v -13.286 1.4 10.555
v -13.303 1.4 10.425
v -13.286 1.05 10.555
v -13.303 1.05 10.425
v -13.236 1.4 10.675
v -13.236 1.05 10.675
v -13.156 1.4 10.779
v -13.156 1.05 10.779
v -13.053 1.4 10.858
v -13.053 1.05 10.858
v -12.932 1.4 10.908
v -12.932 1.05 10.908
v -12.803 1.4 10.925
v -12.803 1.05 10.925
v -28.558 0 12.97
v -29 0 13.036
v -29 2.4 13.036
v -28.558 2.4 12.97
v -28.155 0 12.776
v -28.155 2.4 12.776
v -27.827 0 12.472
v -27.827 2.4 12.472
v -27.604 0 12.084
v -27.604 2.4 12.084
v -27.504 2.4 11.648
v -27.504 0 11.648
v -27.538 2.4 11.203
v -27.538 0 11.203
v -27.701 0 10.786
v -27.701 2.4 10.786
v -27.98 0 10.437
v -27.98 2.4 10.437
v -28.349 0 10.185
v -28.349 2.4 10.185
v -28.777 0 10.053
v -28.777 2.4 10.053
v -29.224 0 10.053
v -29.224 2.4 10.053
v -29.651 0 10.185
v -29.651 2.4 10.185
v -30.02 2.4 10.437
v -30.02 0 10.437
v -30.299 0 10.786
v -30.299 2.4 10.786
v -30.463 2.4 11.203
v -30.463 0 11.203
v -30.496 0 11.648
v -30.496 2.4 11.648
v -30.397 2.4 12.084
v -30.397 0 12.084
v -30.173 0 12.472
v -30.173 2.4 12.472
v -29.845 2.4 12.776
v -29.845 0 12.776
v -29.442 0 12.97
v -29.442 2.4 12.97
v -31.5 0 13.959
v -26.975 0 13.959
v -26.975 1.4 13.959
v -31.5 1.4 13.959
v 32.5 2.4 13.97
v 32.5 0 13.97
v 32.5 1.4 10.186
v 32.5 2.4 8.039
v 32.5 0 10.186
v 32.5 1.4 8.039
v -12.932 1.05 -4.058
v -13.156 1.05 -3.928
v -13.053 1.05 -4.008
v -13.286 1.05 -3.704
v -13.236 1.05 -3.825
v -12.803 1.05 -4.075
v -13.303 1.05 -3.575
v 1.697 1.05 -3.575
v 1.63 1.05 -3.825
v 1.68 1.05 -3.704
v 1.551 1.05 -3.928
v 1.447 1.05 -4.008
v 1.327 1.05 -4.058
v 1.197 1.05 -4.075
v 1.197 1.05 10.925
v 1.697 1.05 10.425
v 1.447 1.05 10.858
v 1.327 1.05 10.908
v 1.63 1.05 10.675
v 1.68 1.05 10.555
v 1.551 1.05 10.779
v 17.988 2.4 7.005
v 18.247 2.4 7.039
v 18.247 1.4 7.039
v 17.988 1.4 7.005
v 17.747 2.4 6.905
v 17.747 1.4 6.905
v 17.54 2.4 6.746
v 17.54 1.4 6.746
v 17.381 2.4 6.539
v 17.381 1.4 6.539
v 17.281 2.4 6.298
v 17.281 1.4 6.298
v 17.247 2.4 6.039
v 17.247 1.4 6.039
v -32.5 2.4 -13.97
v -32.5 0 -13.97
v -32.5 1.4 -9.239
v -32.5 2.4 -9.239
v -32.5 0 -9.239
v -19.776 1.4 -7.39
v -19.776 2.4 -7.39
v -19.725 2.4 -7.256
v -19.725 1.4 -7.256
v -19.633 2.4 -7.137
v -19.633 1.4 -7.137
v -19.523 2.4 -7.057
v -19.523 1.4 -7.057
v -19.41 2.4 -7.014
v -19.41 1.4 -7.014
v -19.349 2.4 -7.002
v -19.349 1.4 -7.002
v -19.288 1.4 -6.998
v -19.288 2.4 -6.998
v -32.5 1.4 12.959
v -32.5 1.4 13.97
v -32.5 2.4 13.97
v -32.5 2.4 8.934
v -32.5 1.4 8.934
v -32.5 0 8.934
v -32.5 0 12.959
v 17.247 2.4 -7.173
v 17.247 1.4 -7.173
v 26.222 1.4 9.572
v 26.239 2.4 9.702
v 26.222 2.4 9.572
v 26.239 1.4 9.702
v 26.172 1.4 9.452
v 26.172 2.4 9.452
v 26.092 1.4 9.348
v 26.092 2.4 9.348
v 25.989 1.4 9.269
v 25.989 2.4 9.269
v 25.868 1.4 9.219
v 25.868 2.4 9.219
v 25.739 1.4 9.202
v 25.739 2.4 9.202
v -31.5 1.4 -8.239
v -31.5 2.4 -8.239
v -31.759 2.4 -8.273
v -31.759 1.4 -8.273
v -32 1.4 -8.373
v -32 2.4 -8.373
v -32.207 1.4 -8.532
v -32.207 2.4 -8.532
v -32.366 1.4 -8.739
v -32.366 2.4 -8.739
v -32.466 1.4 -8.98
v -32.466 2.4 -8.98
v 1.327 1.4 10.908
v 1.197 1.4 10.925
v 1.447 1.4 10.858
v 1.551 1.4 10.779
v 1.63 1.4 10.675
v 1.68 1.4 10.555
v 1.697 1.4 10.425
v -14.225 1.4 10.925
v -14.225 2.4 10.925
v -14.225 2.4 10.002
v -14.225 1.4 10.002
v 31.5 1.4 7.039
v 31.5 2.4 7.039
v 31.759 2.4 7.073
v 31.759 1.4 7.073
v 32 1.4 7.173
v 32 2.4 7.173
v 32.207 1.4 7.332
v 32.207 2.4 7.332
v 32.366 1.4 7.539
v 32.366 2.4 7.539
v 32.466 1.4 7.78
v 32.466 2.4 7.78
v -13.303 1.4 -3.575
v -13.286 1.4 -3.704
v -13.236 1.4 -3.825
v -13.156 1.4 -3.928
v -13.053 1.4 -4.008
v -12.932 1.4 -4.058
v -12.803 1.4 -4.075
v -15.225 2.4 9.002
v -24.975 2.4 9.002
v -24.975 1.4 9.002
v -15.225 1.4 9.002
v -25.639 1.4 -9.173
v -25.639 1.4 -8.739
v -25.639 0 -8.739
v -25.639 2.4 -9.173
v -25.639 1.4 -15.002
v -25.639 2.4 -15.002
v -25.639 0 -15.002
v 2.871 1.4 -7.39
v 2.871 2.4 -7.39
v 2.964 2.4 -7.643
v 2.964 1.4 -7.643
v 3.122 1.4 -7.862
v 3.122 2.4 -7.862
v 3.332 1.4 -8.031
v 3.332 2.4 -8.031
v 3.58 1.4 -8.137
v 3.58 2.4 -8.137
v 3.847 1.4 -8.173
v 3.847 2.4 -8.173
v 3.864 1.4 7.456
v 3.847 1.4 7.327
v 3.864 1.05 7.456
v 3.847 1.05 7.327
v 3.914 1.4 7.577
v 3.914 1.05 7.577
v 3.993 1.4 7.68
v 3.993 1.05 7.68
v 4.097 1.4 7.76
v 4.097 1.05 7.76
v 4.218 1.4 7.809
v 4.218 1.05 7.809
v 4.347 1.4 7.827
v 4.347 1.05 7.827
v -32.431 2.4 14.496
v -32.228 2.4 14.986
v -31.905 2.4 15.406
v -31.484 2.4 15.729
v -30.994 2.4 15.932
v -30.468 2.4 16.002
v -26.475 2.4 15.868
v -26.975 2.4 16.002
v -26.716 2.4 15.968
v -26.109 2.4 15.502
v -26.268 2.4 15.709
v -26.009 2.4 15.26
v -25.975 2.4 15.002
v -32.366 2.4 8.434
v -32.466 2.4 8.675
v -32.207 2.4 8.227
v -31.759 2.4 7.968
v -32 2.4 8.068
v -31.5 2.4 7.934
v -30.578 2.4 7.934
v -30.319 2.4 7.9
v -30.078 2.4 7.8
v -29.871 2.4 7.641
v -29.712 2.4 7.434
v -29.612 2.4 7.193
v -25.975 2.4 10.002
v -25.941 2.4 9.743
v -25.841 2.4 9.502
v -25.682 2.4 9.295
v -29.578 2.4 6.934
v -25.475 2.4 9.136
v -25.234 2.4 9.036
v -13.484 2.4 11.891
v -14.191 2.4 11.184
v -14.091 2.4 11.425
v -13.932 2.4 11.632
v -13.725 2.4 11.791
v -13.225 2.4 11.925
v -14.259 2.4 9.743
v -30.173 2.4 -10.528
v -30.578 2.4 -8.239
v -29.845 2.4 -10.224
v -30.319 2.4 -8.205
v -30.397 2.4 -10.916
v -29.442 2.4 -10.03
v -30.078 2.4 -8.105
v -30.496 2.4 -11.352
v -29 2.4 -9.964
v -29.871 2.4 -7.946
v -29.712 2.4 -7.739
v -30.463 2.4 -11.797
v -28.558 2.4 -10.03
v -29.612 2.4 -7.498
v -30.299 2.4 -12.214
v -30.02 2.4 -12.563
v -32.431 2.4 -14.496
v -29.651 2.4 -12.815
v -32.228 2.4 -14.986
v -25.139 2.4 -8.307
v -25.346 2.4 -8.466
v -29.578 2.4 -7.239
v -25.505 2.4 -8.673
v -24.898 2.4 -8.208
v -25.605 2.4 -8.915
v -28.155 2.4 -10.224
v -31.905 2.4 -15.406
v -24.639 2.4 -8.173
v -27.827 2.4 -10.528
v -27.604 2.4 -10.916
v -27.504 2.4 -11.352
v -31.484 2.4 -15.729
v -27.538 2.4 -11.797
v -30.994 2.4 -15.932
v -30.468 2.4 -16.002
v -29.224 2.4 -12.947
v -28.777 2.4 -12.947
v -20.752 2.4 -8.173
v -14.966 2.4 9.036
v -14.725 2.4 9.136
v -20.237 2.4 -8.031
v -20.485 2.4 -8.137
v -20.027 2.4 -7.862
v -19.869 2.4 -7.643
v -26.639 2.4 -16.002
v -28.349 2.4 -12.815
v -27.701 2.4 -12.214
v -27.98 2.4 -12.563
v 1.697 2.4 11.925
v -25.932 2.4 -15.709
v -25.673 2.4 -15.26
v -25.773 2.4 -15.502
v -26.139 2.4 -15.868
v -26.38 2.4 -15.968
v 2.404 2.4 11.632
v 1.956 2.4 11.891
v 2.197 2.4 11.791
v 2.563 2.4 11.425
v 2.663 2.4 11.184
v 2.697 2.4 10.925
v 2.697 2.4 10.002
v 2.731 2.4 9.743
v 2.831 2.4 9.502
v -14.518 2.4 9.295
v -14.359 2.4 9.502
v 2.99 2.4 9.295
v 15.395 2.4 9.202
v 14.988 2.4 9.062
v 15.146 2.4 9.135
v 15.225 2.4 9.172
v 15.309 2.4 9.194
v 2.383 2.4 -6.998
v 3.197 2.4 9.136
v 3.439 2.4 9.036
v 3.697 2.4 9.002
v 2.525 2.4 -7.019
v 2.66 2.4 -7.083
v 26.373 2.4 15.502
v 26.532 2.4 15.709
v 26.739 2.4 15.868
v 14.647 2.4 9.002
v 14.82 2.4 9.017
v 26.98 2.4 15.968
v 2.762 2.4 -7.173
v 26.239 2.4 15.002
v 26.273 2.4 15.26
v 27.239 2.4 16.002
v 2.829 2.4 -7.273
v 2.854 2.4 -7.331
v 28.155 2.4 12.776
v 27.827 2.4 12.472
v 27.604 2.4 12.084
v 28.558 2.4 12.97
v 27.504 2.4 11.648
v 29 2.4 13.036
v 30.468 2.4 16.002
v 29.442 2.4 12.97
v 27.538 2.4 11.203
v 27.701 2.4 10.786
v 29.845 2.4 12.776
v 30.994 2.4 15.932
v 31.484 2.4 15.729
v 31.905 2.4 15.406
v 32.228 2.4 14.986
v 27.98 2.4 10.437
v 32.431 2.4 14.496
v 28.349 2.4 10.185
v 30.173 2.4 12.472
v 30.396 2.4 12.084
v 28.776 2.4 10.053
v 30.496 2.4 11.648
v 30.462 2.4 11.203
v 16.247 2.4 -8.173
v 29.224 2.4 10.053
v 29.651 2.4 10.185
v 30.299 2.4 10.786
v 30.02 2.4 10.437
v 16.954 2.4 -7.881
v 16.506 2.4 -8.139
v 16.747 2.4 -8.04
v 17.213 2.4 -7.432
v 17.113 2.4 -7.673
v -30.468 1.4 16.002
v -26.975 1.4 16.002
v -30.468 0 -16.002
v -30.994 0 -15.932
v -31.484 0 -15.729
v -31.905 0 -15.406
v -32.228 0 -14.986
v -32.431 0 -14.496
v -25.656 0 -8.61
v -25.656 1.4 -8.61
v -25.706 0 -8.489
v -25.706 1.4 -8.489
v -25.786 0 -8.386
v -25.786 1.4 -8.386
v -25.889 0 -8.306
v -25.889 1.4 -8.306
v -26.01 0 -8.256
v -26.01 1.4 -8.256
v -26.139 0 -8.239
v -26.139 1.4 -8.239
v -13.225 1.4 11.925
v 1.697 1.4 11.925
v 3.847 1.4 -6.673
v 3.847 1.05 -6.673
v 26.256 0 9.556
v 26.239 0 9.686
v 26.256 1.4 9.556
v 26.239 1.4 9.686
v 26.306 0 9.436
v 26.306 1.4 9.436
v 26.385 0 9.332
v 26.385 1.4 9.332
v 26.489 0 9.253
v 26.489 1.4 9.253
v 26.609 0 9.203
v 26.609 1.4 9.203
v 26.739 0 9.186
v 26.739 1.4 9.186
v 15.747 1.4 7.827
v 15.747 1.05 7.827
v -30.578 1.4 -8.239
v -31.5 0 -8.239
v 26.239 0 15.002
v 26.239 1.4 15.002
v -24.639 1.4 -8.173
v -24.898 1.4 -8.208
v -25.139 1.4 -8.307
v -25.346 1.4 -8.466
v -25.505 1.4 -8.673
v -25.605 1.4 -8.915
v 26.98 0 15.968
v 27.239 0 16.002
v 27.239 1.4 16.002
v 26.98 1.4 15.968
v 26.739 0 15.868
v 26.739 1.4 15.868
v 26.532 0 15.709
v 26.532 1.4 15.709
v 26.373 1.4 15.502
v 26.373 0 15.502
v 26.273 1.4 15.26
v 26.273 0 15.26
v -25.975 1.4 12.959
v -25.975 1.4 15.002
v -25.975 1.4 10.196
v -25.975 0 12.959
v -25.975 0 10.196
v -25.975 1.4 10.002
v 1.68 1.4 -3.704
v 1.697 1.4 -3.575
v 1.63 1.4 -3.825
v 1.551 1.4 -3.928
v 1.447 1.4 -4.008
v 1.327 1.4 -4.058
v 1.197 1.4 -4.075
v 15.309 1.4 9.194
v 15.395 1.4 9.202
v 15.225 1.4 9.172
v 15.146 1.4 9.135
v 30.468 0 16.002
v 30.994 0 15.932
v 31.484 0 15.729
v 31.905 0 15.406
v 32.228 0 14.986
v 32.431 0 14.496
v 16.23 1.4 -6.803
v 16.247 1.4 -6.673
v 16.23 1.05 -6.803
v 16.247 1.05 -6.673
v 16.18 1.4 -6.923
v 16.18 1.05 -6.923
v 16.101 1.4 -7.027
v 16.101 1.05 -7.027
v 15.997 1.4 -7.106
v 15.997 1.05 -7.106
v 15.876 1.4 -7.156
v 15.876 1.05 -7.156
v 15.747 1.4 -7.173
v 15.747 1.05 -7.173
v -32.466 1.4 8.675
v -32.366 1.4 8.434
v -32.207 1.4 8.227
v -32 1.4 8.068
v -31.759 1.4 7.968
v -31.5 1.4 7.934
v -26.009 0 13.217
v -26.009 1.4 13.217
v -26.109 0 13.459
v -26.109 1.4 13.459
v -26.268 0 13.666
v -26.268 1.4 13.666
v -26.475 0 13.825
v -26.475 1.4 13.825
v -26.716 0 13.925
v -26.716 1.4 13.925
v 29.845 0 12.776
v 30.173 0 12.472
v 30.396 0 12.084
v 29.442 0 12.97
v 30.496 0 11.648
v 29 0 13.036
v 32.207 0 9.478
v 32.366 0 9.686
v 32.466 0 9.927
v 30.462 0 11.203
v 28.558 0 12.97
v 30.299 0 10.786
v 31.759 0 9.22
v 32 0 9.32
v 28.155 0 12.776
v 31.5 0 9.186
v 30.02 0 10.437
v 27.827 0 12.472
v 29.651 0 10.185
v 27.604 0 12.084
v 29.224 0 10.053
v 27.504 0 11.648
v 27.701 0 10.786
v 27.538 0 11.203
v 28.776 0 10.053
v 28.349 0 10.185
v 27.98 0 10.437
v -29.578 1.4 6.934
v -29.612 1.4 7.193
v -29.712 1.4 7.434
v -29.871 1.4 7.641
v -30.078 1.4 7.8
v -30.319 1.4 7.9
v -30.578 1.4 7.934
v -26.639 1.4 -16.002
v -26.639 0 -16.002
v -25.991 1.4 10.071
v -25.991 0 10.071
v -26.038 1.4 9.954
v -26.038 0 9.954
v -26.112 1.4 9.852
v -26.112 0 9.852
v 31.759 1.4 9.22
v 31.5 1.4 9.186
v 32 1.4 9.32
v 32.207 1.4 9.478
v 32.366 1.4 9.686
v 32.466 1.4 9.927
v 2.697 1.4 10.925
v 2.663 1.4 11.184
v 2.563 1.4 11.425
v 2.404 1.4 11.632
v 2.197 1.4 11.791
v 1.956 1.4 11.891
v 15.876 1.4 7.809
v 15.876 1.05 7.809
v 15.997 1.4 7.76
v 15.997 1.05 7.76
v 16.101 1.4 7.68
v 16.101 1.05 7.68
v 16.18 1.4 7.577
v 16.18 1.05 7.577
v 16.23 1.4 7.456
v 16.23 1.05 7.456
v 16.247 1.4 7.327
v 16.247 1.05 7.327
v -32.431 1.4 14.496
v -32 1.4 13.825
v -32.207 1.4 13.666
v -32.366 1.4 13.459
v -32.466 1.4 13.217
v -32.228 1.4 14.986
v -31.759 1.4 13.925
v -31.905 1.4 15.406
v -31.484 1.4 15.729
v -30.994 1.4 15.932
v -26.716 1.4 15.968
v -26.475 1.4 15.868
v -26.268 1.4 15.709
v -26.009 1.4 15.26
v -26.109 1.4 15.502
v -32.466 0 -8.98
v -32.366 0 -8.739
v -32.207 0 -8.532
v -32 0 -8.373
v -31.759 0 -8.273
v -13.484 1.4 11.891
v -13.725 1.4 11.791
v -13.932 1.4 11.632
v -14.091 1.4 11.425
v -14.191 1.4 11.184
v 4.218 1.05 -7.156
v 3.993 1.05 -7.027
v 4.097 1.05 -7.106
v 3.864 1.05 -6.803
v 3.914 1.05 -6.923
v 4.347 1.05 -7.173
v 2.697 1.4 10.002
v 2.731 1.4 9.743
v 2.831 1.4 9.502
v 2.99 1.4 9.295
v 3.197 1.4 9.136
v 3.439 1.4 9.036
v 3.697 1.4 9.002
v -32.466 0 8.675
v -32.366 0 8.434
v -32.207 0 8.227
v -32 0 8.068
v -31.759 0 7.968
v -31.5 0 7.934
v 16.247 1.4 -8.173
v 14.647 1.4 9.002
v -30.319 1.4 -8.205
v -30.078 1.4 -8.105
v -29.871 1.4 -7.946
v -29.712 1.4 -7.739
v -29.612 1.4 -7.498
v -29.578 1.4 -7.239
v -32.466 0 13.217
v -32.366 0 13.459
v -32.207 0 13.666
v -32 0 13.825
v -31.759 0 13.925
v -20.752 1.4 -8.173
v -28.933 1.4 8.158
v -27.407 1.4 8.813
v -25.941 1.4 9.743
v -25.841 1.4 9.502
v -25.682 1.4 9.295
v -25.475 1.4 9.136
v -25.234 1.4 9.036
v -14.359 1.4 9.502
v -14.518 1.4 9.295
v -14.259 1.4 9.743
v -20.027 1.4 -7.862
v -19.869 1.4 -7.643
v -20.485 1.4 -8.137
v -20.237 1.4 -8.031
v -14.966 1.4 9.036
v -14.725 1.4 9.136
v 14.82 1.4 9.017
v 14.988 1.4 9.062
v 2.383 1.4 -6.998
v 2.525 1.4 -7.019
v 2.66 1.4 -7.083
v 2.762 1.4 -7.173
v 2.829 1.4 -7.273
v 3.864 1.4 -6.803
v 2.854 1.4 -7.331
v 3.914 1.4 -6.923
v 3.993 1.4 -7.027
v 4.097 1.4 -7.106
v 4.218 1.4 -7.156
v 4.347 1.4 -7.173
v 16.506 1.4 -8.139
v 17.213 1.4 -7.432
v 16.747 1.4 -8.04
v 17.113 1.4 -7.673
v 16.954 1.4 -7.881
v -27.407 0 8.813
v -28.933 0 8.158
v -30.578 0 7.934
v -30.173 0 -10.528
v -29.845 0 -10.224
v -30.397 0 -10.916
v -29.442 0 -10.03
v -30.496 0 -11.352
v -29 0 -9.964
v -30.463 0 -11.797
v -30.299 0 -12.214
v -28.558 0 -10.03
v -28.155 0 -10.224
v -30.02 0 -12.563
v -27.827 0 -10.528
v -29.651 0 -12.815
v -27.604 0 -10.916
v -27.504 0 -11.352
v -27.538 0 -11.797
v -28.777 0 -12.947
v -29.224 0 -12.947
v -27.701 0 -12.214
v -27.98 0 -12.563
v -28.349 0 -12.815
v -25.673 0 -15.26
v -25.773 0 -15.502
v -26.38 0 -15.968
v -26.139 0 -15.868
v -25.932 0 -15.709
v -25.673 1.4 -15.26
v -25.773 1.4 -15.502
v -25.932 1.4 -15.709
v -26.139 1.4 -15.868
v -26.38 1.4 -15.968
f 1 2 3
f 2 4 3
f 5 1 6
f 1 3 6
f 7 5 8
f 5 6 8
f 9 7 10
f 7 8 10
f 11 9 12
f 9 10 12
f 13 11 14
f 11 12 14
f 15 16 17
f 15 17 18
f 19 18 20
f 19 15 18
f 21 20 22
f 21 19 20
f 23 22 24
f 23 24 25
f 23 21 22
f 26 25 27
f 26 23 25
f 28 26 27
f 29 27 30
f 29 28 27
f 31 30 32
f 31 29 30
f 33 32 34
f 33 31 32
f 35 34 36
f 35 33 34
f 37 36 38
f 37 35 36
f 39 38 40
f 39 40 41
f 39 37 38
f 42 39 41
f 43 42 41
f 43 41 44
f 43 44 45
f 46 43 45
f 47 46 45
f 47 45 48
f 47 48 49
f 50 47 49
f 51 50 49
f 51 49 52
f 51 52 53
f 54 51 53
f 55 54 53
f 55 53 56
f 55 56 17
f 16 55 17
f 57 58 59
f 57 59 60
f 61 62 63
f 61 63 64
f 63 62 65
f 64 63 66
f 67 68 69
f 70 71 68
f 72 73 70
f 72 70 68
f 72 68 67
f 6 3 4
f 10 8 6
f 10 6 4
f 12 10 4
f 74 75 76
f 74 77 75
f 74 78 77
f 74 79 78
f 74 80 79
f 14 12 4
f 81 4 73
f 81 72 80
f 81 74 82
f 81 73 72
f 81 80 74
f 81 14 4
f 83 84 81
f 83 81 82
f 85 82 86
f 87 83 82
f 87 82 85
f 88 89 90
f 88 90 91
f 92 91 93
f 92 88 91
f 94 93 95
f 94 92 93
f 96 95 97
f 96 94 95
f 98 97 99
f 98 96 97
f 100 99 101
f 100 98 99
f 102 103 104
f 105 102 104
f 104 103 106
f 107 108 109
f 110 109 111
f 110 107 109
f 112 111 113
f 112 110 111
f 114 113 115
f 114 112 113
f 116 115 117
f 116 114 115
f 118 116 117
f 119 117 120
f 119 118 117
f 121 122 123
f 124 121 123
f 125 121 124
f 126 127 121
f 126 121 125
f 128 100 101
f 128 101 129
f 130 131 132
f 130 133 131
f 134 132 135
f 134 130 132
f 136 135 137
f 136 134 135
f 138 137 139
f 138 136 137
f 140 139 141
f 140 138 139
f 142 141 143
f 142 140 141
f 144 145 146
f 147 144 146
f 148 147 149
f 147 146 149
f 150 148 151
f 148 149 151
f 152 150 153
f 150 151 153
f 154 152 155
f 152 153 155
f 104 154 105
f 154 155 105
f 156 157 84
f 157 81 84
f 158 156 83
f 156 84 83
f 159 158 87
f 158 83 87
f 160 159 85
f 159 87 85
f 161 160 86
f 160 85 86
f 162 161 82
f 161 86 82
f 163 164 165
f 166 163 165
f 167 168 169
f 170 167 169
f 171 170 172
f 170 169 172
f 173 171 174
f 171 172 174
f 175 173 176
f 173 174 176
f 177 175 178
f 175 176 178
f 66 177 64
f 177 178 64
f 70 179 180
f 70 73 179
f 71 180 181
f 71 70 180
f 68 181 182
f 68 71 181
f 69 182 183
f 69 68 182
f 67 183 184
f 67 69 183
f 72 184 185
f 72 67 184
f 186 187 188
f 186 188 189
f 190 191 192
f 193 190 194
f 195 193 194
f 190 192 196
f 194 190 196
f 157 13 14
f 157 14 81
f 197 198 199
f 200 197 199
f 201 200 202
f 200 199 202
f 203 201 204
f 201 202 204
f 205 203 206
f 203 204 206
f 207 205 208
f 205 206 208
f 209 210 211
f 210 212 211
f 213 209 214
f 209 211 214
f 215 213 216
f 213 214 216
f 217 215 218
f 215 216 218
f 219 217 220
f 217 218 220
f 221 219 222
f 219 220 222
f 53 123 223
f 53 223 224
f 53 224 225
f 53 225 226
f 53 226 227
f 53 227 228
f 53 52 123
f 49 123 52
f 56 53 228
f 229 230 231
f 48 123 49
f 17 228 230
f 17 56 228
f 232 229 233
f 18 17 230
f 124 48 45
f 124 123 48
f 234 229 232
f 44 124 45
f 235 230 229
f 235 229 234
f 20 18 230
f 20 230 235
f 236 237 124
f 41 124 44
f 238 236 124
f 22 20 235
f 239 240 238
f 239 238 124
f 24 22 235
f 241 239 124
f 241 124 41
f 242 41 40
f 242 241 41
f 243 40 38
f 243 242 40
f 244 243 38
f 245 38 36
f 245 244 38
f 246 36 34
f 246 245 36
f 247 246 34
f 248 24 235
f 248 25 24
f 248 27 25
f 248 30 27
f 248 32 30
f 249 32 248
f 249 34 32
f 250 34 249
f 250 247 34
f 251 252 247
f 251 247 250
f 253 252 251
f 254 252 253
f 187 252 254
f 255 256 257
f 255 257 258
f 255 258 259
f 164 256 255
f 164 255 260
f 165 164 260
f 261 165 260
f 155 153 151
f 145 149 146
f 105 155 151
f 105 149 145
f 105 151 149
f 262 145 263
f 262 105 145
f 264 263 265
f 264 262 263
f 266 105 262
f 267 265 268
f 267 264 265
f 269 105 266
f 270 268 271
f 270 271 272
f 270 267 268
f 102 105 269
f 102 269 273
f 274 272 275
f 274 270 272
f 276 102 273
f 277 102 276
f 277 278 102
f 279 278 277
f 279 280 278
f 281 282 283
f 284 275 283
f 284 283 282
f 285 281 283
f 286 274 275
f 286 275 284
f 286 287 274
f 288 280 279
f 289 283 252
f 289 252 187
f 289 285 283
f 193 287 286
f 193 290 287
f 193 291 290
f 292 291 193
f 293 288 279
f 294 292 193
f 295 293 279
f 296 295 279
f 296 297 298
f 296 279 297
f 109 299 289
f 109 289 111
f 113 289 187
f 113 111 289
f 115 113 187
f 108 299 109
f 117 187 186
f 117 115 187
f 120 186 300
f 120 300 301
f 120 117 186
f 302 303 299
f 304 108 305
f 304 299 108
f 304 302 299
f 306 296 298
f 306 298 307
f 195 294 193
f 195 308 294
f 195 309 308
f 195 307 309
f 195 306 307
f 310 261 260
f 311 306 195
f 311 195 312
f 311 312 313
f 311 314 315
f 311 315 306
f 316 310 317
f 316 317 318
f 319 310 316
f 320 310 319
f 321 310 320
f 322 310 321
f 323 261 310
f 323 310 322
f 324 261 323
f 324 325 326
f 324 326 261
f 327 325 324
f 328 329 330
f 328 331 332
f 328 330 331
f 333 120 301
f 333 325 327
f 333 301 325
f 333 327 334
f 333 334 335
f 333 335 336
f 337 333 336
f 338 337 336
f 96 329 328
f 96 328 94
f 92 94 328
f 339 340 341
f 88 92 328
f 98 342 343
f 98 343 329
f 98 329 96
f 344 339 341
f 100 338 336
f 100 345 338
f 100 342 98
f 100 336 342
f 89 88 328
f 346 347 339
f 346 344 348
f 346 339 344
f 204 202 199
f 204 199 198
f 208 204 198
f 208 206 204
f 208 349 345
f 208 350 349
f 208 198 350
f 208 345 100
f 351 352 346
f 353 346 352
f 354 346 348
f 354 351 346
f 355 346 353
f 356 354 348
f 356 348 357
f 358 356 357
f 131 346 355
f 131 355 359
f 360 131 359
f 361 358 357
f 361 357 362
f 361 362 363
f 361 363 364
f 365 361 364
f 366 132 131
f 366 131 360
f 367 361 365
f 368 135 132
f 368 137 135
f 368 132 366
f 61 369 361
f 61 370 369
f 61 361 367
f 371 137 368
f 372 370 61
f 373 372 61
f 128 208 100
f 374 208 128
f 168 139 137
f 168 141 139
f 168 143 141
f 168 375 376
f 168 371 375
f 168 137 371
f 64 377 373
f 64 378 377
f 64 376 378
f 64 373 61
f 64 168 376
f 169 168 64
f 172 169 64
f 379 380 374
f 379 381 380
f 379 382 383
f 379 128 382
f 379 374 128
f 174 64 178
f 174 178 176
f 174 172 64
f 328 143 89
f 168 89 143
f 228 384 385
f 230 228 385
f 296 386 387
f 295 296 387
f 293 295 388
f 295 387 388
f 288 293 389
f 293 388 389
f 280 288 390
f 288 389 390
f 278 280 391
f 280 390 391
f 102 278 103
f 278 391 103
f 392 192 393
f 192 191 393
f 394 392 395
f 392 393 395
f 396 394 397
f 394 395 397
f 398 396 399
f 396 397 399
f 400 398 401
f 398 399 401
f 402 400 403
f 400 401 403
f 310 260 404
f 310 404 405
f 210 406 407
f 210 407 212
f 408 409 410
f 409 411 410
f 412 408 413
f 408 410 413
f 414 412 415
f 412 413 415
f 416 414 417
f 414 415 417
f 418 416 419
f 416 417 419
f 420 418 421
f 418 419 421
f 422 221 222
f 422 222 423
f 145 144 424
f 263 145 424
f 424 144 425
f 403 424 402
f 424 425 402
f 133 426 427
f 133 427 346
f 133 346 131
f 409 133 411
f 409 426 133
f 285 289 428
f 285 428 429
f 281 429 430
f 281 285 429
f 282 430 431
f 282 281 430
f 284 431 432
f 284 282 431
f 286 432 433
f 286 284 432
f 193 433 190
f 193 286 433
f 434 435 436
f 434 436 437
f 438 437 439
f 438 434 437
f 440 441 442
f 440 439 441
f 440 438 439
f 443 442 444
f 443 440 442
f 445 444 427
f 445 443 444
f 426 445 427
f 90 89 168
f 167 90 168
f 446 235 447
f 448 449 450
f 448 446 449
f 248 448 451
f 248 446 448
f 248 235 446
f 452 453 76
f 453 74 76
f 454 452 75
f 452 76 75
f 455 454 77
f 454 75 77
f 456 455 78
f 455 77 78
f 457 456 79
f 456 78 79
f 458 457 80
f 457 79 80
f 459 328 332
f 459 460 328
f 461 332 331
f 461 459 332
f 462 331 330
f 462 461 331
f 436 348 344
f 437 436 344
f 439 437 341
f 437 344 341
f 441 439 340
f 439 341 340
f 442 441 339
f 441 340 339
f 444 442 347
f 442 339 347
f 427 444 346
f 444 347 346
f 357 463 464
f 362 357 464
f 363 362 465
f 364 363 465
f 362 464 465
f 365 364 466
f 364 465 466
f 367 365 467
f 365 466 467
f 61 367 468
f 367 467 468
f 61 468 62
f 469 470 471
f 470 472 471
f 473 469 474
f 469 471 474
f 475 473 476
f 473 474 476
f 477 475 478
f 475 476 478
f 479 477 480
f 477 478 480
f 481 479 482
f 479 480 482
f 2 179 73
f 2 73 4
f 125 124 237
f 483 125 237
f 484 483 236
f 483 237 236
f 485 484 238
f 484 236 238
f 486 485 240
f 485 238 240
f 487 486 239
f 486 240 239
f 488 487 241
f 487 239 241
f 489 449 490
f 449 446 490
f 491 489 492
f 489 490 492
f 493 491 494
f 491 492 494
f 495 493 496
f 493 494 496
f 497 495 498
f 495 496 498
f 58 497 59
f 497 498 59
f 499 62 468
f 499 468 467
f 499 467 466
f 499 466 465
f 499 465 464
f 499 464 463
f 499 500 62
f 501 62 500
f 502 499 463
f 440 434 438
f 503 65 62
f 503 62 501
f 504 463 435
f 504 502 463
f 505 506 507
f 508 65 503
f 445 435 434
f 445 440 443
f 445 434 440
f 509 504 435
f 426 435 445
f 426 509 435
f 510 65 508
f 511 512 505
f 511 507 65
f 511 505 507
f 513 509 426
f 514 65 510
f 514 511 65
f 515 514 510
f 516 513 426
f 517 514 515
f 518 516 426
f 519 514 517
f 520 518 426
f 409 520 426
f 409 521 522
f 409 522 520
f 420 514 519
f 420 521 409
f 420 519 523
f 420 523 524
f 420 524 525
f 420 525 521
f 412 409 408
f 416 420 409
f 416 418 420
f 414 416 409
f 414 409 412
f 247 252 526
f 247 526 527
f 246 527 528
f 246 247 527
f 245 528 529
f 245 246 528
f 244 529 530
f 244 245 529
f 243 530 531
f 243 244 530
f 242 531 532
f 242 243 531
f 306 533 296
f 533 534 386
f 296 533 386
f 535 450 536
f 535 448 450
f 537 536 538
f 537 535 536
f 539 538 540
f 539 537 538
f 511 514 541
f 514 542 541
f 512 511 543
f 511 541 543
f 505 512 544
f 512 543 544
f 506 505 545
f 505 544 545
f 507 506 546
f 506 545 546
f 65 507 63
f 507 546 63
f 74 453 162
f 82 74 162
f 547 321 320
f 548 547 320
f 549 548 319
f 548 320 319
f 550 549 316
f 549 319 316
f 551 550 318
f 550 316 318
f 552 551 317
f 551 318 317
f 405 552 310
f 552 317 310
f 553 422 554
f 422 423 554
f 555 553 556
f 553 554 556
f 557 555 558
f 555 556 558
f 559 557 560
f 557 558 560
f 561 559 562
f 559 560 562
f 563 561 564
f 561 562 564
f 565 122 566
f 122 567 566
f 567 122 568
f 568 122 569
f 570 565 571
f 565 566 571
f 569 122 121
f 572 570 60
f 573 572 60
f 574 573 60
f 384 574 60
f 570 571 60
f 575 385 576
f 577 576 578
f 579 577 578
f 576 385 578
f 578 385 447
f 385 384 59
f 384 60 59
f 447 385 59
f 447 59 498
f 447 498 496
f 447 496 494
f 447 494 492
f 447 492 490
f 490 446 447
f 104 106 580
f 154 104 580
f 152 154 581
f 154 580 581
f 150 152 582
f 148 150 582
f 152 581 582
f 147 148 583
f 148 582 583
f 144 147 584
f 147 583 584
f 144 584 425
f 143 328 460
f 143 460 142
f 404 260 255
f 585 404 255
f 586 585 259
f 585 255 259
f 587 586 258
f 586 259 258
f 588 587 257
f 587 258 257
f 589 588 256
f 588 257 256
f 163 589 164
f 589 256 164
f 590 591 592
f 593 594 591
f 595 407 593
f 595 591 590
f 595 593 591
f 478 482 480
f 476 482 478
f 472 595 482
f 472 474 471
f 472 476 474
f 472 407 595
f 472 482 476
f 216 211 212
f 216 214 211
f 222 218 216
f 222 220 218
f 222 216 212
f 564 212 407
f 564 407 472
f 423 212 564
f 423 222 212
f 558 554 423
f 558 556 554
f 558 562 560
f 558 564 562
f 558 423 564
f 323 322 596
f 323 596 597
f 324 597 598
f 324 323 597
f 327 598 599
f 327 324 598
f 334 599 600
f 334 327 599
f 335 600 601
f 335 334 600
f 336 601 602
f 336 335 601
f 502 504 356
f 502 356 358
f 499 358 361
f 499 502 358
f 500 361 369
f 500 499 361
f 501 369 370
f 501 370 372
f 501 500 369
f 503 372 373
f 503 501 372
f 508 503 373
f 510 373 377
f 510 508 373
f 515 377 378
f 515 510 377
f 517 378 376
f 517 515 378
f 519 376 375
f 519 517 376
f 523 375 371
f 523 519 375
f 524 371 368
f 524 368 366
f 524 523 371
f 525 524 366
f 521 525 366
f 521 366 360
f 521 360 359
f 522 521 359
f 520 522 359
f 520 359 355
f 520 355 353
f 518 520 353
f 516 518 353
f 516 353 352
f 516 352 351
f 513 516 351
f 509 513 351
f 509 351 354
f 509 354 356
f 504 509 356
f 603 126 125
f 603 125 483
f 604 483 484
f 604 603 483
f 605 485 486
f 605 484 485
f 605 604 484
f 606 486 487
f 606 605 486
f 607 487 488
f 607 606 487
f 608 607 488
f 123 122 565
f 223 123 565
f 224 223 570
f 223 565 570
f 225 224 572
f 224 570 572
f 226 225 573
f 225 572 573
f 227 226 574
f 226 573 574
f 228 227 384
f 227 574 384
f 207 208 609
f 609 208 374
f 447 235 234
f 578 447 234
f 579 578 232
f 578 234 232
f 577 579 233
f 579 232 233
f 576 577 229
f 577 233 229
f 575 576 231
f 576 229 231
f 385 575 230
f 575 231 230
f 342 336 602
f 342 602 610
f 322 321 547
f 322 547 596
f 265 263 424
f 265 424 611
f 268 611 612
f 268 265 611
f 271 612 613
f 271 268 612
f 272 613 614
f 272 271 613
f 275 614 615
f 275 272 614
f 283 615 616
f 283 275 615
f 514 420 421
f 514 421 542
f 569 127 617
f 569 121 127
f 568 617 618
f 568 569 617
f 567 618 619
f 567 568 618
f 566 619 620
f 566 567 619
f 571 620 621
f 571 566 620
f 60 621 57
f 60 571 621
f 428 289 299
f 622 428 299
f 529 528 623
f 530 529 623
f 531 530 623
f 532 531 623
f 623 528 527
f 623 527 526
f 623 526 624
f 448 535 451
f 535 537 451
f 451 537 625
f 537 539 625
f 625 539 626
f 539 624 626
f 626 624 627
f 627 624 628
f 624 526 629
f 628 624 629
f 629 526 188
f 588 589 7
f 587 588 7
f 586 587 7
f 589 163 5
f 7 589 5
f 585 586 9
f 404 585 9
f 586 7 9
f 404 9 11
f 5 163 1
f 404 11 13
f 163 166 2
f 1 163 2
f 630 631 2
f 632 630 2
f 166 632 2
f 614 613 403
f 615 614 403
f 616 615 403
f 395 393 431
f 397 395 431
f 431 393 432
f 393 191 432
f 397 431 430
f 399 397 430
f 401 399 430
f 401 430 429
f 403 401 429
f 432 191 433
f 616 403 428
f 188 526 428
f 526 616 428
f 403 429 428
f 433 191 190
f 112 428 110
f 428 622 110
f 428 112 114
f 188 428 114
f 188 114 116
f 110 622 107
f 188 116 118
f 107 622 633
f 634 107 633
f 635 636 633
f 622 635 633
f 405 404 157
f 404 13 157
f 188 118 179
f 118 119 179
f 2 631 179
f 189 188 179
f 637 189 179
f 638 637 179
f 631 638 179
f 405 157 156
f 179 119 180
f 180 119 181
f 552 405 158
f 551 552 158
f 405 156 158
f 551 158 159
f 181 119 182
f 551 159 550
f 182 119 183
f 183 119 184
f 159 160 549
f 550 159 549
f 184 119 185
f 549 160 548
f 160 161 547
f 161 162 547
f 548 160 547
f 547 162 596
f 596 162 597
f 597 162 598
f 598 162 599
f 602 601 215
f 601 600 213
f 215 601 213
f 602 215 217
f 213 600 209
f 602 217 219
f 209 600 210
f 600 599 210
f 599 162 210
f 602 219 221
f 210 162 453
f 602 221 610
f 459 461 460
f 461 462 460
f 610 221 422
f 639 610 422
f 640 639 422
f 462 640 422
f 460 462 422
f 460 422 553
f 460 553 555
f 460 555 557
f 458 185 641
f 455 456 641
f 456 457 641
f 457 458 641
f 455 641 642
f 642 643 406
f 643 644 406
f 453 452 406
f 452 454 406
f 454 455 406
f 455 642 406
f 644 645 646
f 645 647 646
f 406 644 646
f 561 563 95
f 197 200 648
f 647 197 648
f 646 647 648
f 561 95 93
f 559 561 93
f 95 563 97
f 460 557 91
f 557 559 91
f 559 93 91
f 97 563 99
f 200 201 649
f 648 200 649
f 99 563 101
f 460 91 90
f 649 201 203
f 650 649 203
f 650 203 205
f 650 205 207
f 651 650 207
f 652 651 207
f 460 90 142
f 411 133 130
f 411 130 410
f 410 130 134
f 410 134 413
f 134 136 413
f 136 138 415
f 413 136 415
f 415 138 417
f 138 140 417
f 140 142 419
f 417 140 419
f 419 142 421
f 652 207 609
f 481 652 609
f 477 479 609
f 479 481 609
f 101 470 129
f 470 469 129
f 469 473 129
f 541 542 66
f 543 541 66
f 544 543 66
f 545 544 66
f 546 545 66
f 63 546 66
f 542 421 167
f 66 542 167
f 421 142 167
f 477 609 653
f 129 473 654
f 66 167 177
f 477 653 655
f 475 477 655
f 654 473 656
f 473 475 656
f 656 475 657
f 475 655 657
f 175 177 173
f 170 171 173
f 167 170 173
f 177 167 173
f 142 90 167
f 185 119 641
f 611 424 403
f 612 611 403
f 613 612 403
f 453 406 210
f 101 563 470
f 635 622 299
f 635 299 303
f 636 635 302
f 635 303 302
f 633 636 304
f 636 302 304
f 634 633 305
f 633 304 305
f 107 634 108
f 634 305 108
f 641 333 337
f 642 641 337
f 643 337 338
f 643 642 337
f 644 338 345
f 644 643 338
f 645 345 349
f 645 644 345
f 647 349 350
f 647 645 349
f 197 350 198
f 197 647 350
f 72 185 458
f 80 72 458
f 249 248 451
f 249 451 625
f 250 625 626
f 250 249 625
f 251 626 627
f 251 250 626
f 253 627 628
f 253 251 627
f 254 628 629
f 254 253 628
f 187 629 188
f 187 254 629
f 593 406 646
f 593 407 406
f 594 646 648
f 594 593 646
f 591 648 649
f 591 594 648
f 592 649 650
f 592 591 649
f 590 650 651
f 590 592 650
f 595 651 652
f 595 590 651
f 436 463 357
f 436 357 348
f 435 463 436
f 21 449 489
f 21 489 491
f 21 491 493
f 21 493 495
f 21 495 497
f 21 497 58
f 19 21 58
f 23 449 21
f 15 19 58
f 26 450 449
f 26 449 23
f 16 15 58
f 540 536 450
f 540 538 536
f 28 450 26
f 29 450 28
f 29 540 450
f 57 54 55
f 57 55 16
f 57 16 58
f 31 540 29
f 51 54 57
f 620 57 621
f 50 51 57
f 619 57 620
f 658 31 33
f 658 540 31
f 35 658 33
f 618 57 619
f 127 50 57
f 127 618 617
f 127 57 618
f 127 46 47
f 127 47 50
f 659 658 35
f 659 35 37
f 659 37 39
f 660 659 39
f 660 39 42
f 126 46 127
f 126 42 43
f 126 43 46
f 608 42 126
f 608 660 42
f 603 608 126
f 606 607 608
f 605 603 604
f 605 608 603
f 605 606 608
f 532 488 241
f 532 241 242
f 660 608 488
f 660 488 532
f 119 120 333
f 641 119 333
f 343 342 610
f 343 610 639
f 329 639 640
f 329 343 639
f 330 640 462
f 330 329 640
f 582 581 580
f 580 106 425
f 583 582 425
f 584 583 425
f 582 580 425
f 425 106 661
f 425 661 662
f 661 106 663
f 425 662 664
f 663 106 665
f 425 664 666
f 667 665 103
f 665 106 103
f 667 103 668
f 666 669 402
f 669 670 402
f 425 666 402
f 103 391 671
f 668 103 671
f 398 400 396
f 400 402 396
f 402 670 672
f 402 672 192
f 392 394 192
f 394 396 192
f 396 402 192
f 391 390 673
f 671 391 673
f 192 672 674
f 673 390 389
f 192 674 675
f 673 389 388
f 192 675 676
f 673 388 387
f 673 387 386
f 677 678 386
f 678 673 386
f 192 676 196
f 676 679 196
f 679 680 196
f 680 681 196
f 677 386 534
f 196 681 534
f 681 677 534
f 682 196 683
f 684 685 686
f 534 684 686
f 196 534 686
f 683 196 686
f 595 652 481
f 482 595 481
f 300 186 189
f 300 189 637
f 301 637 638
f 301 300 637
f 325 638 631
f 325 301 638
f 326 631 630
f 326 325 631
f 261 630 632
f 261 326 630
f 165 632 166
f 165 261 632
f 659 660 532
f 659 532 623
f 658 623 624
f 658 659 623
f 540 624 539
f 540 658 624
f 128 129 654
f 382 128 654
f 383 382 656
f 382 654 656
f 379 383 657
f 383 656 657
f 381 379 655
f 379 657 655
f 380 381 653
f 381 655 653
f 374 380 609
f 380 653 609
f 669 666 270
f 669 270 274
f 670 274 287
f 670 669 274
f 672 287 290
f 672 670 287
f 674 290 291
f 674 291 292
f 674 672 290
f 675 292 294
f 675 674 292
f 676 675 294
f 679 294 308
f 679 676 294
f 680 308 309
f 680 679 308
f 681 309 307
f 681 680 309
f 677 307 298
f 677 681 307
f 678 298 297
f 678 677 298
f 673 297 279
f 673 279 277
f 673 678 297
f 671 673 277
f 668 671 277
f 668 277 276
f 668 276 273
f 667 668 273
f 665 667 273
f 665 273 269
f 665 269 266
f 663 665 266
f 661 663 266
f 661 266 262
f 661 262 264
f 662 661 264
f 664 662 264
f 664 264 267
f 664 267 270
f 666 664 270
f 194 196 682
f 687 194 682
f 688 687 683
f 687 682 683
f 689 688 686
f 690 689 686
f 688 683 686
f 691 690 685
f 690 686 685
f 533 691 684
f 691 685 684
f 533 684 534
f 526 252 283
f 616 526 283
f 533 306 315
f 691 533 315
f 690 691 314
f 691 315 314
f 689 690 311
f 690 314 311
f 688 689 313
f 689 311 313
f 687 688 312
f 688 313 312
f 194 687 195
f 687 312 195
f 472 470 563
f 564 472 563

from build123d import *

# Parameters (mm, degrees)
BOSS_EXTRUDE1_START = 1.4
SKETCH2_R           = 1.5
BOSS_EXTRUDE1_DEPTH = 1
SKETCH4_W           = 51.3
SKETCH4_H           = 7.828136
CUT_EXTRUDE1_DEPTH  = 37.239562
SKETCH5_W           = 15.253092
SKETCH5_H           = 23.040436
CUT_EXTRUDE2_DEPTH  = 37.239562
SKETCH6_W           = 22.069426
SKETCH6_H           = 6.8
SKETCH6_W_2         = 11.75
SKETCH6_H_2         = 7
CUT_EXTRUDE3_DEPTH  = 37.239562
SKETCH7_W           = 2.92226
SKETCH7_H           = 16.173552
SKETCH7_W_2         = 22.599024
SKETCH7_H_2         = 1.175102
CUT_EXTRUDE4_DEPTH  = 37.239562
FILLET8_R           = 1
FILLET10_R          = 0.5
SKETCH9_W           = 12.4
SKETCH9_H           = 15
SKETCH9_W_2         = 15
BOSS_EXTRUDE2_DEPTH = 0.35
FILLET3_R           = 0.5
BOSS_EXTRUDE3_START = -2.4
SKETCH10_R          = 1.5
BOSS_EXTRUDE3_DEPTH = 2.4
FILLET6_R           = 0.5
FILLET11_R          = 1
FILLET13_R          = 0.5


with BuildPart() as part:
    # Sketch2 → Boss-Extrude1 (new body)
    with BuildSketch(Plane(origin=(0, 0, 0), x_dir=(1, 0, 0), z_dir=(0, 1, 0)).offset(BOSS_EXTRUDE1_START)):
        with BuildLine():
            Line((-32.500062, 13.969619), (-32.500062, -13.969619))
            ThreePointArc((-32.500062, -13.969619), (-31.904903, -15.40646), (-30.468062, -16.001619))
            Line((-30.468062, -16.001619), (30.468062, -16.001619))
            ThreePointArc((30.468062, -16.001619), (31.904903, -15.40646), (32.500062, -13.969619))
            Line((32.500062, -13.969619), (32.500062, 13.969619))
            ThreePointArc((32.500062, 13.969619), (31.904903, 15.40646), (30.468062, 16.001619))
            Line((30.468062, 16.001619), (-30.468062, 16.001619))
            ThreePointArc((-30.468062, 16.001619), (-31.904903, 15.40646), (-32.500062, 13.969619))
        make_face()
        with Locations(Location((28.999942, 11.463655, 0), (0, 0, 270))):
            Circle(SKETCH2_R, mode=Mode.SUBTRACT)
        with Locations(Location((28.999942, -11.536299, 0), (0, 0, 270))):
            Circle(SKETCH2_R, mode=Mode.SUBTRACT)
        with Locations(Location((-29.000196, -11.536299, 0), (0, 0, 270))):
            Circle(SKETCH2_R, mode=Mode.SUBTRACT)
        with Locations(Location((-29.000196, 11.463655, 0), (0, 0, 270))):
            Circle(SKETCH2_R, mode=Mode.SUBTRACT)
    extrude(amount=BOSS_EXTRUDE1_DEPTH)

    # Sketch4 → Cut-Extrude1 (cut, through all)
    with BuildSketch(Plane(origin=(0, 2.4, 0), x_dir=(1, 0, 0), z_dir=(0, 1, 0))):
        with Locations((0.010922, 12.087551)):
            Rectangle(SKETCH4_W, SKETCH4_H)
    extrude(amount=-CUT_EXTRUDE1_DEPTH, mode=Mode.SUBTRACT)

    # Sketch5 → Cut-Extrude2 (cut, through all)
    with BuildSketch(Plane(origin=(0, 2.4, 0), x_dir=(1, 0, 0), z_dir=(0, 1, 0))):
        with Locations((24.873516, 4.481401)):
            Rectangle(SKETCH5_W, SKETCH5_H)
    extrude(amount=-CUT_EXTRUDE2_DEPTH, mode=Mode.SUBTRACT)

    # Sketch6 → Cut-Extrude3 (cut, through all)
    with BuildSketch(Plane(origin=(0, 2.4, 0), x_dir=(1, 0, 0), z_dir=(0, 1, 0))):
        with Locations((15.204059, -12.601619)):
            Rectangle(SKETCH6_W, SKETCH6_H)
        with Locations((-20.100036, -12.501619)):
            Rectangle(SKETCH6_W_2, SKETCH6_H_2)
    extrude(amount=-CUT_EXTRUDE3_DEPTH, mode=Mode.SUBTRACT)

    # Sketch7 → Cut-Extrude4 (cut, through all)
    with BuildSketch(Plane(origin=(0, 2.4, 0), x_dir=(1, 0, 0), z_dir=(0, 1, 0))):
        Polygon((2.69737, -11.925317), (2.69737, -9.001619), (15.24697, -9.001619), (15.24697, -16.001619), (-14.225036, -16.001619), (-14.225036, -11.925317), align=None)
        with Locations((-31.038932, 0.152527)):
            Rectangle(SKETCH7_W, SKETCH7_H)
        with Locations((-8.452542, 7.585932)):
            Rectangle(SKETCH7_W_2, SKETCH7_H_2)
    extrude(amount=-CUT_EXTRUDE4_DEPTH, mode=Mode.SUBTRACT)

    # Fillet8
    # the kernel refuses this fillet: 1 mm, written as the material it adds along each edge
    with BuildSketch(Plane(origin=(15.24697, 2.4, 9.001619), x_dir=(0, 0, 1), z_dir=(0, -1, 0))) as fillet8_piece_1:
        with BuildLine():
            CenterArc((1, 0.6), FILLET8_R, 180, 36.869898)
            Line((0, 0.6), (0, 0))
            Line((0, 0), (0.2, 0))
        make_face()
    extrude(amount=1)
    with BuildSketch(Plane(origin=(-29.577802, 2.4, 7.934249), x_dir=(-1, 0, 0), z_dir=(0, -1, 0)), Plane(origin=(-25.975036, 2.4, 9.001619), x_dir=(1, 0, 0), z_dir=(0, -1, 0)), Plane(origin=(-14.225036, 2.4, 9.001619), x_dir=(0, 0, 1), z_dir=(0, -1, 0)), Plane(origin=(2.69737, 2.4, 9.001619), x_dir=(1, 0, 0), z_dir=(0, -1, 0)), Plane(origin=(17.24697, 2.4, 7.038817), x_dir=(0, 0, -1), z_dir=(0, -1, 0)), Plane(origin=(-25.639078, 2.4, -8.173483), x_dir=(0, 0, -1), z_dir=(0, -1, 0)), Plane(origin=(-29.577802, 2.4, -8.239303), x_dir=(0, 0, 1), z_dir=(0, -1, 0))) as fillet8_piece_2:
        with BuildLine():
            CenterArc((FILLET8_R, FILLET8_R), FILLET8_R, 180, 90)
            Line((0, FILLET8_R), (0, 0))
            Line((0, 0), (FILLET8_R, 0))
        make_face()
    extrude(amount=1)
    # the kernel refuses this fillet: 1 mm, written as the material it takes off along each edge
    with BuildSketch(Plane(origin=(-32.500062, 4.9, 7.934249), x_dir=(0, 0, 1), z_dir=(0, -1, 0)), Plane(origin=(-25.975036, 4.9, 16.001619), x_dir=(0, 0, -1), z_dir=(0, -1, 0)), Plane(origin=(-14.225036, 4.9, 11.925317), x_dir=(1, 0, 0), z_dir=(0, -1, 0)), Plane(origin=(2.69737, 4.9, 11.925317), x_dir=(0, 0, -1), z_dir=(0, -1, 0)), Plane(origin=(26.238772, 4.9, 16.001619), x_dir=(1, 0, 0), z_dir=(0, -1, 0)), Plane(origin=(2.84697, 4.9, -8.173483), x_dir=(0, 0, 1), z_dir=(0, -1, 0)), Plane(origin=(-19.752054, 4.9, -8.173483), x_dir=(-1, 0, 0), z_dir=(0, -1, 0)), Plane(origin=(-25.639078, 4.9, -16.001619), x_dir=(-1, 0, 0), z_dir=(0, -1, 0)), Plane(origin=(-32.500062, 4.9, -8.239303), x_dir=(1, 0, 0), z_dir=(0, -1, 0)), Plane(origin=(32.500062, 4.9, 7.038817), x_dir=(-1, 0, 0), z_dir=(0, -1, 0))) as fillet8_2_piece_1:
        with BuildLine():
            CenterArc((FILLET8_R, -FILLET8_R), FILLET8_R, 90, 90)
            Line((0, -FILLET8_R), (0, 0))
            Line((0, 0), (FILLET8_R, 0))
        make_face()
    extrude(amount=6, mode=Mode.SUBTRACT)
    with BuildSketch(Plane(origin=(17.24697, -1.1, -8.173483), x_dir=(-1, 0, 0), z_dir=(0, 1, 0))) as fillet8_2_piece_2:
        with BuildLine():
            CenterArc((FILLET8_R, FILLET8_R), FILLET8_R, 180, 90)
            Line((0, FILLET8_R), (0, 0))
            Line((0, 0), (FILLET8_R, 0))
        make_face()
    extrude(amount=6, mode=Mode.SUBTRACT)

    # Fillet10
    fillet10_edges = [part.edges().sort_by_distance(p)[0] for p in [
        (26.238772, 1.9, 9.201619),
    ]]
    fillet(fillet10_edges, radius=FILLET10_R)

    # Sketch9 → Boss-Extrude2 (add)
    with BuildSketch(Plane.XZ.offset(-1.4)):
        with Locations((10.04697, 0.326517)):
            Rectangle(SKETCH9_W, SKETCH9_H)
        with Locations((-5.80263, 3.425317)):
            Rectangle(SKETCH9_W_2, SKETCH9_H)
    extrude(amount=BOSS_EXTRUDE2_DEPTH)

    # Fillet3
    fillet3_edges = [part.edges().sort_by_distance(p)[0] for p in [
        (16.24697, 1.225, 7.826517),
        (3.84697, 1.225, 7.826517),
        (3.84697, 1.225, -7.173483),
        (16.24697, 1.225, -7.173483),
        (1.69737, 1.225, 10.925317),
        (-13.30263, 1.225, 10.925317),
        (-13.30263, 1.225, -4.074683),
        (1.69737, 1.225, -4.074683),
    ]]
    fillet(fillet3_edges, radius=FILLET3_R)

    # Sketch10 → Boss-Extrude3 (add)
    # profile 1 of 3: a face of its own
    with BuildSketch(Plane(origin=(0, 2.4, 0), x_dir=(1, 0, 0), z_dir=(0, 1, 0)).offset(BOSS_EXTRUDE3_START)):
        with BuildLine():
            Line((-30.577802, 8.239303), (-25.639078, 8.239303))
            Line((-25.639078, 8.239303), (-25.639078, 9.173483))
            Line((-25.639078, 9.173483), (-25.639078, 15.001619))
            ThreePointArc((-25.639078, 15.001619), (-25.931971, 15.708726), (-26.639078, 16.001619))
            Line((-26.639078, 16.001619), (-30.468062, 16.001619))
            ThreePointArc((-30.468062, 16.001619), (-31.904903, 15.40646), (-32.500062, 13.969619))
            Line((-32.500062, 13.969619), (-32.500062, 9.239303))
            ThreePointArc((-32.500062, 9.239303), (-32.207169, 8.532196), (-31.500062, 8.239303))
            Line((-31.500062, 8.239303), (-30.577802, 8.239303))
        make_face()
        with Locations(Location((-29.000196, 11.463655, 0), (0, 0, 270))):
            Circle(SKETCH10_R, mode=Mode.SUBTRACT)
    # profile 2 of 3: a face of its own
    with BuildSketch(Plane(origin=(0, 2.4, 0), x_dir=(1, 0, 0), z_dir=(0, 1, 0)).offset(BOSS_EXTRUDE3_START)):
        with BuildLine():
            Line((-25.975036, -10.001619), (-25.975036, -13.958671))
            Line((-25.975036, -13.958671), (-32.500062, -13.958671))
            Line((-32.500062, -13.958671), (-32.500062, -8.934249))
            ThreePointArc((-32.500062, -8.934249), (-32.207169, -8.227142), (-31.500062, -7.934249))
            Line((-31.500062, -7.934249), (-30.577802, -7.934249))
            ThreePointArc((-30.577802, -7.934249), (-28.054933, -8.47482), (-25.975036, -10.001619))
        make_face()
        with Locations(Location((-29.000196, -11.536299, 0), (0, 0, 270))):
            Circle(SKETCH10_R, mode=Mode.SUBTRACT)
    # profile 3 of 3: a face of its own
    with BuildSketch(Plane(origin=(0, 2.4, 0), x_dir=(1, 0, 0), z_dir=(0, 1, 0)).offset(BOSS_EXTRUDE3_START)):
        with BuildLine():
            Line((26.238772, -9.701619), (26.238772, -9.185593))
            Line((26.238772, -9.185593), (32.500062, -9.185593))
            Line((32.500062, -9.185593), (32.500062, -13.969619))
            ThreePointArc((32.500062, -13.969619), (31.904903, -15.40646), (30.468062, -16.001619))
            Line((30.468062, -16.001619), (27.238772, -16.001619))
            ThreePointArc((27.238772, -16.001619), (26.531665, -15.708726), (26.238772, -15.001619))
            Line((26.238772, -15.001619), (26.238772, -9.701619))
        make_face()
        with Locations(Location((28.999942, -11.536299, 0), (0, 0, 270))):
            Circle(SKETCH10_R, mode=Mode.SUBTRACT)
    extrude(amount=BOSS_EXTRUDE3_DEPTH)

    # Fillet6
    fillet6_edges = [part.edges().sort_by_distance(p)[0] for p in [
        (15.24697, 1.9, 9.201619),
        (2.84697, 1.9, -6.998381),
        (-19.752054, 1.9, -6.998381),
        (-25.639078, 0.7, -8.239303),
    ]]
    fillet(fillet6_edges, radius=FILLET6_R)

    # Fillet11
    fillet11_edges = [part.edges().sort_by_distance(p)[0] for p in [
        (-25.975036, 0.7, 13.958671),
        (-32.500062, 0.7, 13.958671),
        (32.500062, 0.7, 9.185593),
    ]]
    fillet(fillet11_edges, radius=FILLET11_R)

    # Fillet13
    fillet13_edges = [part.edges().sort_by_distance(p)[0] for p in [
        (-25.975036, 0.7, 10.001619),
        (26.238772, 0.7, 9.185593),
    ]]
    fillet(fillet13_edges, radius=FILLET13_R)


solid = part.part
